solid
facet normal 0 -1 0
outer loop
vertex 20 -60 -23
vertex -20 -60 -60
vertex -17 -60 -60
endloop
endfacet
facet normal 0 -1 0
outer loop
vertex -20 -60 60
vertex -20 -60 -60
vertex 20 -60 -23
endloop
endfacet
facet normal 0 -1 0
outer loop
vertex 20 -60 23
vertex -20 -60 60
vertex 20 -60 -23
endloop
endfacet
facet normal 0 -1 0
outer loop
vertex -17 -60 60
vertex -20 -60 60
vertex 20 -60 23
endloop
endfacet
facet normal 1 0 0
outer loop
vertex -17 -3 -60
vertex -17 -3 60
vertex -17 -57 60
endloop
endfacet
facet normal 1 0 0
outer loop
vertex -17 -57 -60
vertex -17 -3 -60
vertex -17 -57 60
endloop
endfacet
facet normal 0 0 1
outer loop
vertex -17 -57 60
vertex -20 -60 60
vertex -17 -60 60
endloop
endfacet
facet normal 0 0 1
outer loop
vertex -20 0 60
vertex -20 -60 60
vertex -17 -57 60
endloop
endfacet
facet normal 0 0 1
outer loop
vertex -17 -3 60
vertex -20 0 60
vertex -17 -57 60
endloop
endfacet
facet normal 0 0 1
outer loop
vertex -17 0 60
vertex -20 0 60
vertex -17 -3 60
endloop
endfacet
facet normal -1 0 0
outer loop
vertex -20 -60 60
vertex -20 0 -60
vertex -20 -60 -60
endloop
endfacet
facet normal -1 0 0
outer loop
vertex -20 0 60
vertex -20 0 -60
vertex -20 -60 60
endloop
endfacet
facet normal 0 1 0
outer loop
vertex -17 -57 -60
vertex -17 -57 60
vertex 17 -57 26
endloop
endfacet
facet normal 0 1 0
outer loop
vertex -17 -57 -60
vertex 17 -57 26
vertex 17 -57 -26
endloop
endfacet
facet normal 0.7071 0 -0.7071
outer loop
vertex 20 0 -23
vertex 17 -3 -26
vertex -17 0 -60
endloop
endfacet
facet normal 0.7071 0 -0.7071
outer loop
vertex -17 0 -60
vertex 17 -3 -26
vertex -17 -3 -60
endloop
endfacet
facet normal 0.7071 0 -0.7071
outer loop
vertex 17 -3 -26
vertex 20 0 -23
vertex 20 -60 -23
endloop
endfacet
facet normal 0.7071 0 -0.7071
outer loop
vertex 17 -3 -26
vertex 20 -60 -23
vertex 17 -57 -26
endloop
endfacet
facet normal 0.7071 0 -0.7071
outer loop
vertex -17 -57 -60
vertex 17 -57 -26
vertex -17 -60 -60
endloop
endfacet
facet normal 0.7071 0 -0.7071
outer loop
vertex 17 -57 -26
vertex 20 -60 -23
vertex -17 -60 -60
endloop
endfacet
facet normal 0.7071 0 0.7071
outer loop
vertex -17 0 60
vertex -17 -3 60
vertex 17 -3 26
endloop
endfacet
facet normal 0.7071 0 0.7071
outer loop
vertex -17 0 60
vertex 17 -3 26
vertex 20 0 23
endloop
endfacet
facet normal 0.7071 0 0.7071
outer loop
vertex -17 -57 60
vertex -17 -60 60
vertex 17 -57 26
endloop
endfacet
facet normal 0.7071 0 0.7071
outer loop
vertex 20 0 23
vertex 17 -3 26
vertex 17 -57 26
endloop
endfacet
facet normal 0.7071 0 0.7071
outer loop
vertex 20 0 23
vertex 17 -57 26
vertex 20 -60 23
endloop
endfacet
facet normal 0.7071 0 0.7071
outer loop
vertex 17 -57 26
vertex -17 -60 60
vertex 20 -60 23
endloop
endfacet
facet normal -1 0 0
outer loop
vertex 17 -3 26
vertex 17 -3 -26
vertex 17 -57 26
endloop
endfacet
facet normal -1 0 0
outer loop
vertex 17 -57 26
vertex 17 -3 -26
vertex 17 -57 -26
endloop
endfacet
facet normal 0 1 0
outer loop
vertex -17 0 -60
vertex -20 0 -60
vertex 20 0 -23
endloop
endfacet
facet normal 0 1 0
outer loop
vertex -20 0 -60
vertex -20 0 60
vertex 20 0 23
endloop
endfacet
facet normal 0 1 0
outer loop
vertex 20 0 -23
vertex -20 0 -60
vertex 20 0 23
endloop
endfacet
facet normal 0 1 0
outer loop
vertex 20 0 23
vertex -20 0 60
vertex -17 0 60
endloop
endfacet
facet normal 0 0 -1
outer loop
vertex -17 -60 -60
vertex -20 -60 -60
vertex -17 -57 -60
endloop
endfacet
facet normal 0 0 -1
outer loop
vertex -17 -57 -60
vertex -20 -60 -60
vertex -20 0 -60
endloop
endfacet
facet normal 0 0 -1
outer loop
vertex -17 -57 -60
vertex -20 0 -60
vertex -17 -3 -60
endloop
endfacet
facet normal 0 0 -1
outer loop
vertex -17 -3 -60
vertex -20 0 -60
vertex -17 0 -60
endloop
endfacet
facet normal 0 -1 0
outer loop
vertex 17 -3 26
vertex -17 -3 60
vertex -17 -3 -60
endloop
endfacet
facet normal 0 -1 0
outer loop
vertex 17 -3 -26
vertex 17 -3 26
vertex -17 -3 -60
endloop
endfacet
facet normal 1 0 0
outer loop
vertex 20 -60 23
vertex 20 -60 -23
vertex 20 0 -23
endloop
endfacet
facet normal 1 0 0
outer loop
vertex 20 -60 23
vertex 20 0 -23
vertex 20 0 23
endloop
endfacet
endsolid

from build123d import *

# Parameters (mm, degrees)
F0_W     = 40
F0_H     = 120
F1_DEPTH = 60
F2_W     = 34
F2_H     = 54
F3_DEPTH = 450
F5_DEPTH = 61


with BuildPart() as f1:
    # F0 (on Front) → F1 (new body)
    with BuildSketch(Plane.XZ):
        Rectangle(F0_W, F0_H)
    extrude(amount=F1_DEPTH)

    # F2 (on face) → F3 (cut)
    with BuildSketch(Plane(origin=(0, 0, -60), x_dir=(1, 0, 0), z_dir=(0, 0, -1))):
        with Locations((0, 30)):
            Rectangle(F2_W, F2_H)
    extrude(amount=-F3_DEPTH, mode=Mode.SUBTRACT)

    # F4 (on face) → F5 (cut)
    with BuildSketch(Plane.XZ.offset(60)):
        Polygon((20, 60), (-17, 60), (20, 23), align=None)
        Polygon((20, -60), (20, -23), (-17, -60), align=None)
    extrude(amount=-F5_DEPTH, mode=Mode.SUBTRACT)


solid = f1.part
